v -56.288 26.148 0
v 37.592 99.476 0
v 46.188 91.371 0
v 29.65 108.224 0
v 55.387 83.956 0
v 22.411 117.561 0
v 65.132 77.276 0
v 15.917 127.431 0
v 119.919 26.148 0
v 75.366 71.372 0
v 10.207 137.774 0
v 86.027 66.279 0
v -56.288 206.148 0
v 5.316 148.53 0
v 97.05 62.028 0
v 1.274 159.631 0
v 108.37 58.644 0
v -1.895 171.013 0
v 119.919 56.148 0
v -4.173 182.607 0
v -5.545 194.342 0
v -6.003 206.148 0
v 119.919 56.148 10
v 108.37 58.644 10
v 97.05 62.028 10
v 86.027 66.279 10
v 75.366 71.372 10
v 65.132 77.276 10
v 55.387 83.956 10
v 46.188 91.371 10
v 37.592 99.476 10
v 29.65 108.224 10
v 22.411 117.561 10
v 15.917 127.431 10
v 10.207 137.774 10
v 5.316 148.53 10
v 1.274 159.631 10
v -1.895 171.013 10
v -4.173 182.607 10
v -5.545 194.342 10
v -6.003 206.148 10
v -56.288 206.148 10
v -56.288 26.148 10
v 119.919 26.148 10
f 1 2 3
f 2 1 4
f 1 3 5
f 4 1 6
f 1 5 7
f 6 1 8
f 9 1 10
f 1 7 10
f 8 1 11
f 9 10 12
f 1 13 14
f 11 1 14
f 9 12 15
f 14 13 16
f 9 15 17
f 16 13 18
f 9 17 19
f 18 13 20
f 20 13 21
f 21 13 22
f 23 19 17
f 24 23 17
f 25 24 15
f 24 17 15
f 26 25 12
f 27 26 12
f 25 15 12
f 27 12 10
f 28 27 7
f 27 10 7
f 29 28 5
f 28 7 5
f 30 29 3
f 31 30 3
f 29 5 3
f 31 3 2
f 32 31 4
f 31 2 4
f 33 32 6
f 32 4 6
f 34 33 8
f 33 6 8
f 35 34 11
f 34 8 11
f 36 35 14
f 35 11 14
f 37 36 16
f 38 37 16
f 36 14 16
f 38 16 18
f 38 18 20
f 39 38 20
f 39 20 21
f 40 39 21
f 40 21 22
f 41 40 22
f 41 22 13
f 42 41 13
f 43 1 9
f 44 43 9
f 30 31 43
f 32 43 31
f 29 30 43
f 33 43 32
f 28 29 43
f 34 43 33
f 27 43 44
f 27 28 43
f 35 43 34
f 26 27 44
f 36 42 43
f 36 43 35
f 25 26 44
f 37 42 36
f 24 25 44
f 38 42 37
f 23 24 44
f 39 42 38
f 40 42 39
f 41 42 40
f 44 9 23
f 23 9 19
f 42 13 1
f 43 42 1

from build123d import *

# Parameters (mm, degrees)
SALIENTE_EXTRUIR1_DEPTH = 10


with BuildPart() as part:
    # Croquis1 → Saliente-Extruir1 (new body)
    with BuildSketch(Plane.XY):
        with BuildLine():
            Line((-56.28767918, 206.147542534), (-56.28767918, 26.147542534))
            Line((-56.28767918, 26.147542534), (119.918563855, 26.147542534))
            Line((119.918563855, 26.147542534), (119.918563855, 56.147542534))
            ThreePointArc((119.918563855, 56.147542534), (29.650497915, 108.223742781), (-6.003166727, 206.147542534))
            Line((-6.003166727, 206.147542534), (-56.28767918, 206.147542534))
        make_face()
    extrude(amount=SALIENTE_EXTRUIR1_DEPTH)


solid = part.part
